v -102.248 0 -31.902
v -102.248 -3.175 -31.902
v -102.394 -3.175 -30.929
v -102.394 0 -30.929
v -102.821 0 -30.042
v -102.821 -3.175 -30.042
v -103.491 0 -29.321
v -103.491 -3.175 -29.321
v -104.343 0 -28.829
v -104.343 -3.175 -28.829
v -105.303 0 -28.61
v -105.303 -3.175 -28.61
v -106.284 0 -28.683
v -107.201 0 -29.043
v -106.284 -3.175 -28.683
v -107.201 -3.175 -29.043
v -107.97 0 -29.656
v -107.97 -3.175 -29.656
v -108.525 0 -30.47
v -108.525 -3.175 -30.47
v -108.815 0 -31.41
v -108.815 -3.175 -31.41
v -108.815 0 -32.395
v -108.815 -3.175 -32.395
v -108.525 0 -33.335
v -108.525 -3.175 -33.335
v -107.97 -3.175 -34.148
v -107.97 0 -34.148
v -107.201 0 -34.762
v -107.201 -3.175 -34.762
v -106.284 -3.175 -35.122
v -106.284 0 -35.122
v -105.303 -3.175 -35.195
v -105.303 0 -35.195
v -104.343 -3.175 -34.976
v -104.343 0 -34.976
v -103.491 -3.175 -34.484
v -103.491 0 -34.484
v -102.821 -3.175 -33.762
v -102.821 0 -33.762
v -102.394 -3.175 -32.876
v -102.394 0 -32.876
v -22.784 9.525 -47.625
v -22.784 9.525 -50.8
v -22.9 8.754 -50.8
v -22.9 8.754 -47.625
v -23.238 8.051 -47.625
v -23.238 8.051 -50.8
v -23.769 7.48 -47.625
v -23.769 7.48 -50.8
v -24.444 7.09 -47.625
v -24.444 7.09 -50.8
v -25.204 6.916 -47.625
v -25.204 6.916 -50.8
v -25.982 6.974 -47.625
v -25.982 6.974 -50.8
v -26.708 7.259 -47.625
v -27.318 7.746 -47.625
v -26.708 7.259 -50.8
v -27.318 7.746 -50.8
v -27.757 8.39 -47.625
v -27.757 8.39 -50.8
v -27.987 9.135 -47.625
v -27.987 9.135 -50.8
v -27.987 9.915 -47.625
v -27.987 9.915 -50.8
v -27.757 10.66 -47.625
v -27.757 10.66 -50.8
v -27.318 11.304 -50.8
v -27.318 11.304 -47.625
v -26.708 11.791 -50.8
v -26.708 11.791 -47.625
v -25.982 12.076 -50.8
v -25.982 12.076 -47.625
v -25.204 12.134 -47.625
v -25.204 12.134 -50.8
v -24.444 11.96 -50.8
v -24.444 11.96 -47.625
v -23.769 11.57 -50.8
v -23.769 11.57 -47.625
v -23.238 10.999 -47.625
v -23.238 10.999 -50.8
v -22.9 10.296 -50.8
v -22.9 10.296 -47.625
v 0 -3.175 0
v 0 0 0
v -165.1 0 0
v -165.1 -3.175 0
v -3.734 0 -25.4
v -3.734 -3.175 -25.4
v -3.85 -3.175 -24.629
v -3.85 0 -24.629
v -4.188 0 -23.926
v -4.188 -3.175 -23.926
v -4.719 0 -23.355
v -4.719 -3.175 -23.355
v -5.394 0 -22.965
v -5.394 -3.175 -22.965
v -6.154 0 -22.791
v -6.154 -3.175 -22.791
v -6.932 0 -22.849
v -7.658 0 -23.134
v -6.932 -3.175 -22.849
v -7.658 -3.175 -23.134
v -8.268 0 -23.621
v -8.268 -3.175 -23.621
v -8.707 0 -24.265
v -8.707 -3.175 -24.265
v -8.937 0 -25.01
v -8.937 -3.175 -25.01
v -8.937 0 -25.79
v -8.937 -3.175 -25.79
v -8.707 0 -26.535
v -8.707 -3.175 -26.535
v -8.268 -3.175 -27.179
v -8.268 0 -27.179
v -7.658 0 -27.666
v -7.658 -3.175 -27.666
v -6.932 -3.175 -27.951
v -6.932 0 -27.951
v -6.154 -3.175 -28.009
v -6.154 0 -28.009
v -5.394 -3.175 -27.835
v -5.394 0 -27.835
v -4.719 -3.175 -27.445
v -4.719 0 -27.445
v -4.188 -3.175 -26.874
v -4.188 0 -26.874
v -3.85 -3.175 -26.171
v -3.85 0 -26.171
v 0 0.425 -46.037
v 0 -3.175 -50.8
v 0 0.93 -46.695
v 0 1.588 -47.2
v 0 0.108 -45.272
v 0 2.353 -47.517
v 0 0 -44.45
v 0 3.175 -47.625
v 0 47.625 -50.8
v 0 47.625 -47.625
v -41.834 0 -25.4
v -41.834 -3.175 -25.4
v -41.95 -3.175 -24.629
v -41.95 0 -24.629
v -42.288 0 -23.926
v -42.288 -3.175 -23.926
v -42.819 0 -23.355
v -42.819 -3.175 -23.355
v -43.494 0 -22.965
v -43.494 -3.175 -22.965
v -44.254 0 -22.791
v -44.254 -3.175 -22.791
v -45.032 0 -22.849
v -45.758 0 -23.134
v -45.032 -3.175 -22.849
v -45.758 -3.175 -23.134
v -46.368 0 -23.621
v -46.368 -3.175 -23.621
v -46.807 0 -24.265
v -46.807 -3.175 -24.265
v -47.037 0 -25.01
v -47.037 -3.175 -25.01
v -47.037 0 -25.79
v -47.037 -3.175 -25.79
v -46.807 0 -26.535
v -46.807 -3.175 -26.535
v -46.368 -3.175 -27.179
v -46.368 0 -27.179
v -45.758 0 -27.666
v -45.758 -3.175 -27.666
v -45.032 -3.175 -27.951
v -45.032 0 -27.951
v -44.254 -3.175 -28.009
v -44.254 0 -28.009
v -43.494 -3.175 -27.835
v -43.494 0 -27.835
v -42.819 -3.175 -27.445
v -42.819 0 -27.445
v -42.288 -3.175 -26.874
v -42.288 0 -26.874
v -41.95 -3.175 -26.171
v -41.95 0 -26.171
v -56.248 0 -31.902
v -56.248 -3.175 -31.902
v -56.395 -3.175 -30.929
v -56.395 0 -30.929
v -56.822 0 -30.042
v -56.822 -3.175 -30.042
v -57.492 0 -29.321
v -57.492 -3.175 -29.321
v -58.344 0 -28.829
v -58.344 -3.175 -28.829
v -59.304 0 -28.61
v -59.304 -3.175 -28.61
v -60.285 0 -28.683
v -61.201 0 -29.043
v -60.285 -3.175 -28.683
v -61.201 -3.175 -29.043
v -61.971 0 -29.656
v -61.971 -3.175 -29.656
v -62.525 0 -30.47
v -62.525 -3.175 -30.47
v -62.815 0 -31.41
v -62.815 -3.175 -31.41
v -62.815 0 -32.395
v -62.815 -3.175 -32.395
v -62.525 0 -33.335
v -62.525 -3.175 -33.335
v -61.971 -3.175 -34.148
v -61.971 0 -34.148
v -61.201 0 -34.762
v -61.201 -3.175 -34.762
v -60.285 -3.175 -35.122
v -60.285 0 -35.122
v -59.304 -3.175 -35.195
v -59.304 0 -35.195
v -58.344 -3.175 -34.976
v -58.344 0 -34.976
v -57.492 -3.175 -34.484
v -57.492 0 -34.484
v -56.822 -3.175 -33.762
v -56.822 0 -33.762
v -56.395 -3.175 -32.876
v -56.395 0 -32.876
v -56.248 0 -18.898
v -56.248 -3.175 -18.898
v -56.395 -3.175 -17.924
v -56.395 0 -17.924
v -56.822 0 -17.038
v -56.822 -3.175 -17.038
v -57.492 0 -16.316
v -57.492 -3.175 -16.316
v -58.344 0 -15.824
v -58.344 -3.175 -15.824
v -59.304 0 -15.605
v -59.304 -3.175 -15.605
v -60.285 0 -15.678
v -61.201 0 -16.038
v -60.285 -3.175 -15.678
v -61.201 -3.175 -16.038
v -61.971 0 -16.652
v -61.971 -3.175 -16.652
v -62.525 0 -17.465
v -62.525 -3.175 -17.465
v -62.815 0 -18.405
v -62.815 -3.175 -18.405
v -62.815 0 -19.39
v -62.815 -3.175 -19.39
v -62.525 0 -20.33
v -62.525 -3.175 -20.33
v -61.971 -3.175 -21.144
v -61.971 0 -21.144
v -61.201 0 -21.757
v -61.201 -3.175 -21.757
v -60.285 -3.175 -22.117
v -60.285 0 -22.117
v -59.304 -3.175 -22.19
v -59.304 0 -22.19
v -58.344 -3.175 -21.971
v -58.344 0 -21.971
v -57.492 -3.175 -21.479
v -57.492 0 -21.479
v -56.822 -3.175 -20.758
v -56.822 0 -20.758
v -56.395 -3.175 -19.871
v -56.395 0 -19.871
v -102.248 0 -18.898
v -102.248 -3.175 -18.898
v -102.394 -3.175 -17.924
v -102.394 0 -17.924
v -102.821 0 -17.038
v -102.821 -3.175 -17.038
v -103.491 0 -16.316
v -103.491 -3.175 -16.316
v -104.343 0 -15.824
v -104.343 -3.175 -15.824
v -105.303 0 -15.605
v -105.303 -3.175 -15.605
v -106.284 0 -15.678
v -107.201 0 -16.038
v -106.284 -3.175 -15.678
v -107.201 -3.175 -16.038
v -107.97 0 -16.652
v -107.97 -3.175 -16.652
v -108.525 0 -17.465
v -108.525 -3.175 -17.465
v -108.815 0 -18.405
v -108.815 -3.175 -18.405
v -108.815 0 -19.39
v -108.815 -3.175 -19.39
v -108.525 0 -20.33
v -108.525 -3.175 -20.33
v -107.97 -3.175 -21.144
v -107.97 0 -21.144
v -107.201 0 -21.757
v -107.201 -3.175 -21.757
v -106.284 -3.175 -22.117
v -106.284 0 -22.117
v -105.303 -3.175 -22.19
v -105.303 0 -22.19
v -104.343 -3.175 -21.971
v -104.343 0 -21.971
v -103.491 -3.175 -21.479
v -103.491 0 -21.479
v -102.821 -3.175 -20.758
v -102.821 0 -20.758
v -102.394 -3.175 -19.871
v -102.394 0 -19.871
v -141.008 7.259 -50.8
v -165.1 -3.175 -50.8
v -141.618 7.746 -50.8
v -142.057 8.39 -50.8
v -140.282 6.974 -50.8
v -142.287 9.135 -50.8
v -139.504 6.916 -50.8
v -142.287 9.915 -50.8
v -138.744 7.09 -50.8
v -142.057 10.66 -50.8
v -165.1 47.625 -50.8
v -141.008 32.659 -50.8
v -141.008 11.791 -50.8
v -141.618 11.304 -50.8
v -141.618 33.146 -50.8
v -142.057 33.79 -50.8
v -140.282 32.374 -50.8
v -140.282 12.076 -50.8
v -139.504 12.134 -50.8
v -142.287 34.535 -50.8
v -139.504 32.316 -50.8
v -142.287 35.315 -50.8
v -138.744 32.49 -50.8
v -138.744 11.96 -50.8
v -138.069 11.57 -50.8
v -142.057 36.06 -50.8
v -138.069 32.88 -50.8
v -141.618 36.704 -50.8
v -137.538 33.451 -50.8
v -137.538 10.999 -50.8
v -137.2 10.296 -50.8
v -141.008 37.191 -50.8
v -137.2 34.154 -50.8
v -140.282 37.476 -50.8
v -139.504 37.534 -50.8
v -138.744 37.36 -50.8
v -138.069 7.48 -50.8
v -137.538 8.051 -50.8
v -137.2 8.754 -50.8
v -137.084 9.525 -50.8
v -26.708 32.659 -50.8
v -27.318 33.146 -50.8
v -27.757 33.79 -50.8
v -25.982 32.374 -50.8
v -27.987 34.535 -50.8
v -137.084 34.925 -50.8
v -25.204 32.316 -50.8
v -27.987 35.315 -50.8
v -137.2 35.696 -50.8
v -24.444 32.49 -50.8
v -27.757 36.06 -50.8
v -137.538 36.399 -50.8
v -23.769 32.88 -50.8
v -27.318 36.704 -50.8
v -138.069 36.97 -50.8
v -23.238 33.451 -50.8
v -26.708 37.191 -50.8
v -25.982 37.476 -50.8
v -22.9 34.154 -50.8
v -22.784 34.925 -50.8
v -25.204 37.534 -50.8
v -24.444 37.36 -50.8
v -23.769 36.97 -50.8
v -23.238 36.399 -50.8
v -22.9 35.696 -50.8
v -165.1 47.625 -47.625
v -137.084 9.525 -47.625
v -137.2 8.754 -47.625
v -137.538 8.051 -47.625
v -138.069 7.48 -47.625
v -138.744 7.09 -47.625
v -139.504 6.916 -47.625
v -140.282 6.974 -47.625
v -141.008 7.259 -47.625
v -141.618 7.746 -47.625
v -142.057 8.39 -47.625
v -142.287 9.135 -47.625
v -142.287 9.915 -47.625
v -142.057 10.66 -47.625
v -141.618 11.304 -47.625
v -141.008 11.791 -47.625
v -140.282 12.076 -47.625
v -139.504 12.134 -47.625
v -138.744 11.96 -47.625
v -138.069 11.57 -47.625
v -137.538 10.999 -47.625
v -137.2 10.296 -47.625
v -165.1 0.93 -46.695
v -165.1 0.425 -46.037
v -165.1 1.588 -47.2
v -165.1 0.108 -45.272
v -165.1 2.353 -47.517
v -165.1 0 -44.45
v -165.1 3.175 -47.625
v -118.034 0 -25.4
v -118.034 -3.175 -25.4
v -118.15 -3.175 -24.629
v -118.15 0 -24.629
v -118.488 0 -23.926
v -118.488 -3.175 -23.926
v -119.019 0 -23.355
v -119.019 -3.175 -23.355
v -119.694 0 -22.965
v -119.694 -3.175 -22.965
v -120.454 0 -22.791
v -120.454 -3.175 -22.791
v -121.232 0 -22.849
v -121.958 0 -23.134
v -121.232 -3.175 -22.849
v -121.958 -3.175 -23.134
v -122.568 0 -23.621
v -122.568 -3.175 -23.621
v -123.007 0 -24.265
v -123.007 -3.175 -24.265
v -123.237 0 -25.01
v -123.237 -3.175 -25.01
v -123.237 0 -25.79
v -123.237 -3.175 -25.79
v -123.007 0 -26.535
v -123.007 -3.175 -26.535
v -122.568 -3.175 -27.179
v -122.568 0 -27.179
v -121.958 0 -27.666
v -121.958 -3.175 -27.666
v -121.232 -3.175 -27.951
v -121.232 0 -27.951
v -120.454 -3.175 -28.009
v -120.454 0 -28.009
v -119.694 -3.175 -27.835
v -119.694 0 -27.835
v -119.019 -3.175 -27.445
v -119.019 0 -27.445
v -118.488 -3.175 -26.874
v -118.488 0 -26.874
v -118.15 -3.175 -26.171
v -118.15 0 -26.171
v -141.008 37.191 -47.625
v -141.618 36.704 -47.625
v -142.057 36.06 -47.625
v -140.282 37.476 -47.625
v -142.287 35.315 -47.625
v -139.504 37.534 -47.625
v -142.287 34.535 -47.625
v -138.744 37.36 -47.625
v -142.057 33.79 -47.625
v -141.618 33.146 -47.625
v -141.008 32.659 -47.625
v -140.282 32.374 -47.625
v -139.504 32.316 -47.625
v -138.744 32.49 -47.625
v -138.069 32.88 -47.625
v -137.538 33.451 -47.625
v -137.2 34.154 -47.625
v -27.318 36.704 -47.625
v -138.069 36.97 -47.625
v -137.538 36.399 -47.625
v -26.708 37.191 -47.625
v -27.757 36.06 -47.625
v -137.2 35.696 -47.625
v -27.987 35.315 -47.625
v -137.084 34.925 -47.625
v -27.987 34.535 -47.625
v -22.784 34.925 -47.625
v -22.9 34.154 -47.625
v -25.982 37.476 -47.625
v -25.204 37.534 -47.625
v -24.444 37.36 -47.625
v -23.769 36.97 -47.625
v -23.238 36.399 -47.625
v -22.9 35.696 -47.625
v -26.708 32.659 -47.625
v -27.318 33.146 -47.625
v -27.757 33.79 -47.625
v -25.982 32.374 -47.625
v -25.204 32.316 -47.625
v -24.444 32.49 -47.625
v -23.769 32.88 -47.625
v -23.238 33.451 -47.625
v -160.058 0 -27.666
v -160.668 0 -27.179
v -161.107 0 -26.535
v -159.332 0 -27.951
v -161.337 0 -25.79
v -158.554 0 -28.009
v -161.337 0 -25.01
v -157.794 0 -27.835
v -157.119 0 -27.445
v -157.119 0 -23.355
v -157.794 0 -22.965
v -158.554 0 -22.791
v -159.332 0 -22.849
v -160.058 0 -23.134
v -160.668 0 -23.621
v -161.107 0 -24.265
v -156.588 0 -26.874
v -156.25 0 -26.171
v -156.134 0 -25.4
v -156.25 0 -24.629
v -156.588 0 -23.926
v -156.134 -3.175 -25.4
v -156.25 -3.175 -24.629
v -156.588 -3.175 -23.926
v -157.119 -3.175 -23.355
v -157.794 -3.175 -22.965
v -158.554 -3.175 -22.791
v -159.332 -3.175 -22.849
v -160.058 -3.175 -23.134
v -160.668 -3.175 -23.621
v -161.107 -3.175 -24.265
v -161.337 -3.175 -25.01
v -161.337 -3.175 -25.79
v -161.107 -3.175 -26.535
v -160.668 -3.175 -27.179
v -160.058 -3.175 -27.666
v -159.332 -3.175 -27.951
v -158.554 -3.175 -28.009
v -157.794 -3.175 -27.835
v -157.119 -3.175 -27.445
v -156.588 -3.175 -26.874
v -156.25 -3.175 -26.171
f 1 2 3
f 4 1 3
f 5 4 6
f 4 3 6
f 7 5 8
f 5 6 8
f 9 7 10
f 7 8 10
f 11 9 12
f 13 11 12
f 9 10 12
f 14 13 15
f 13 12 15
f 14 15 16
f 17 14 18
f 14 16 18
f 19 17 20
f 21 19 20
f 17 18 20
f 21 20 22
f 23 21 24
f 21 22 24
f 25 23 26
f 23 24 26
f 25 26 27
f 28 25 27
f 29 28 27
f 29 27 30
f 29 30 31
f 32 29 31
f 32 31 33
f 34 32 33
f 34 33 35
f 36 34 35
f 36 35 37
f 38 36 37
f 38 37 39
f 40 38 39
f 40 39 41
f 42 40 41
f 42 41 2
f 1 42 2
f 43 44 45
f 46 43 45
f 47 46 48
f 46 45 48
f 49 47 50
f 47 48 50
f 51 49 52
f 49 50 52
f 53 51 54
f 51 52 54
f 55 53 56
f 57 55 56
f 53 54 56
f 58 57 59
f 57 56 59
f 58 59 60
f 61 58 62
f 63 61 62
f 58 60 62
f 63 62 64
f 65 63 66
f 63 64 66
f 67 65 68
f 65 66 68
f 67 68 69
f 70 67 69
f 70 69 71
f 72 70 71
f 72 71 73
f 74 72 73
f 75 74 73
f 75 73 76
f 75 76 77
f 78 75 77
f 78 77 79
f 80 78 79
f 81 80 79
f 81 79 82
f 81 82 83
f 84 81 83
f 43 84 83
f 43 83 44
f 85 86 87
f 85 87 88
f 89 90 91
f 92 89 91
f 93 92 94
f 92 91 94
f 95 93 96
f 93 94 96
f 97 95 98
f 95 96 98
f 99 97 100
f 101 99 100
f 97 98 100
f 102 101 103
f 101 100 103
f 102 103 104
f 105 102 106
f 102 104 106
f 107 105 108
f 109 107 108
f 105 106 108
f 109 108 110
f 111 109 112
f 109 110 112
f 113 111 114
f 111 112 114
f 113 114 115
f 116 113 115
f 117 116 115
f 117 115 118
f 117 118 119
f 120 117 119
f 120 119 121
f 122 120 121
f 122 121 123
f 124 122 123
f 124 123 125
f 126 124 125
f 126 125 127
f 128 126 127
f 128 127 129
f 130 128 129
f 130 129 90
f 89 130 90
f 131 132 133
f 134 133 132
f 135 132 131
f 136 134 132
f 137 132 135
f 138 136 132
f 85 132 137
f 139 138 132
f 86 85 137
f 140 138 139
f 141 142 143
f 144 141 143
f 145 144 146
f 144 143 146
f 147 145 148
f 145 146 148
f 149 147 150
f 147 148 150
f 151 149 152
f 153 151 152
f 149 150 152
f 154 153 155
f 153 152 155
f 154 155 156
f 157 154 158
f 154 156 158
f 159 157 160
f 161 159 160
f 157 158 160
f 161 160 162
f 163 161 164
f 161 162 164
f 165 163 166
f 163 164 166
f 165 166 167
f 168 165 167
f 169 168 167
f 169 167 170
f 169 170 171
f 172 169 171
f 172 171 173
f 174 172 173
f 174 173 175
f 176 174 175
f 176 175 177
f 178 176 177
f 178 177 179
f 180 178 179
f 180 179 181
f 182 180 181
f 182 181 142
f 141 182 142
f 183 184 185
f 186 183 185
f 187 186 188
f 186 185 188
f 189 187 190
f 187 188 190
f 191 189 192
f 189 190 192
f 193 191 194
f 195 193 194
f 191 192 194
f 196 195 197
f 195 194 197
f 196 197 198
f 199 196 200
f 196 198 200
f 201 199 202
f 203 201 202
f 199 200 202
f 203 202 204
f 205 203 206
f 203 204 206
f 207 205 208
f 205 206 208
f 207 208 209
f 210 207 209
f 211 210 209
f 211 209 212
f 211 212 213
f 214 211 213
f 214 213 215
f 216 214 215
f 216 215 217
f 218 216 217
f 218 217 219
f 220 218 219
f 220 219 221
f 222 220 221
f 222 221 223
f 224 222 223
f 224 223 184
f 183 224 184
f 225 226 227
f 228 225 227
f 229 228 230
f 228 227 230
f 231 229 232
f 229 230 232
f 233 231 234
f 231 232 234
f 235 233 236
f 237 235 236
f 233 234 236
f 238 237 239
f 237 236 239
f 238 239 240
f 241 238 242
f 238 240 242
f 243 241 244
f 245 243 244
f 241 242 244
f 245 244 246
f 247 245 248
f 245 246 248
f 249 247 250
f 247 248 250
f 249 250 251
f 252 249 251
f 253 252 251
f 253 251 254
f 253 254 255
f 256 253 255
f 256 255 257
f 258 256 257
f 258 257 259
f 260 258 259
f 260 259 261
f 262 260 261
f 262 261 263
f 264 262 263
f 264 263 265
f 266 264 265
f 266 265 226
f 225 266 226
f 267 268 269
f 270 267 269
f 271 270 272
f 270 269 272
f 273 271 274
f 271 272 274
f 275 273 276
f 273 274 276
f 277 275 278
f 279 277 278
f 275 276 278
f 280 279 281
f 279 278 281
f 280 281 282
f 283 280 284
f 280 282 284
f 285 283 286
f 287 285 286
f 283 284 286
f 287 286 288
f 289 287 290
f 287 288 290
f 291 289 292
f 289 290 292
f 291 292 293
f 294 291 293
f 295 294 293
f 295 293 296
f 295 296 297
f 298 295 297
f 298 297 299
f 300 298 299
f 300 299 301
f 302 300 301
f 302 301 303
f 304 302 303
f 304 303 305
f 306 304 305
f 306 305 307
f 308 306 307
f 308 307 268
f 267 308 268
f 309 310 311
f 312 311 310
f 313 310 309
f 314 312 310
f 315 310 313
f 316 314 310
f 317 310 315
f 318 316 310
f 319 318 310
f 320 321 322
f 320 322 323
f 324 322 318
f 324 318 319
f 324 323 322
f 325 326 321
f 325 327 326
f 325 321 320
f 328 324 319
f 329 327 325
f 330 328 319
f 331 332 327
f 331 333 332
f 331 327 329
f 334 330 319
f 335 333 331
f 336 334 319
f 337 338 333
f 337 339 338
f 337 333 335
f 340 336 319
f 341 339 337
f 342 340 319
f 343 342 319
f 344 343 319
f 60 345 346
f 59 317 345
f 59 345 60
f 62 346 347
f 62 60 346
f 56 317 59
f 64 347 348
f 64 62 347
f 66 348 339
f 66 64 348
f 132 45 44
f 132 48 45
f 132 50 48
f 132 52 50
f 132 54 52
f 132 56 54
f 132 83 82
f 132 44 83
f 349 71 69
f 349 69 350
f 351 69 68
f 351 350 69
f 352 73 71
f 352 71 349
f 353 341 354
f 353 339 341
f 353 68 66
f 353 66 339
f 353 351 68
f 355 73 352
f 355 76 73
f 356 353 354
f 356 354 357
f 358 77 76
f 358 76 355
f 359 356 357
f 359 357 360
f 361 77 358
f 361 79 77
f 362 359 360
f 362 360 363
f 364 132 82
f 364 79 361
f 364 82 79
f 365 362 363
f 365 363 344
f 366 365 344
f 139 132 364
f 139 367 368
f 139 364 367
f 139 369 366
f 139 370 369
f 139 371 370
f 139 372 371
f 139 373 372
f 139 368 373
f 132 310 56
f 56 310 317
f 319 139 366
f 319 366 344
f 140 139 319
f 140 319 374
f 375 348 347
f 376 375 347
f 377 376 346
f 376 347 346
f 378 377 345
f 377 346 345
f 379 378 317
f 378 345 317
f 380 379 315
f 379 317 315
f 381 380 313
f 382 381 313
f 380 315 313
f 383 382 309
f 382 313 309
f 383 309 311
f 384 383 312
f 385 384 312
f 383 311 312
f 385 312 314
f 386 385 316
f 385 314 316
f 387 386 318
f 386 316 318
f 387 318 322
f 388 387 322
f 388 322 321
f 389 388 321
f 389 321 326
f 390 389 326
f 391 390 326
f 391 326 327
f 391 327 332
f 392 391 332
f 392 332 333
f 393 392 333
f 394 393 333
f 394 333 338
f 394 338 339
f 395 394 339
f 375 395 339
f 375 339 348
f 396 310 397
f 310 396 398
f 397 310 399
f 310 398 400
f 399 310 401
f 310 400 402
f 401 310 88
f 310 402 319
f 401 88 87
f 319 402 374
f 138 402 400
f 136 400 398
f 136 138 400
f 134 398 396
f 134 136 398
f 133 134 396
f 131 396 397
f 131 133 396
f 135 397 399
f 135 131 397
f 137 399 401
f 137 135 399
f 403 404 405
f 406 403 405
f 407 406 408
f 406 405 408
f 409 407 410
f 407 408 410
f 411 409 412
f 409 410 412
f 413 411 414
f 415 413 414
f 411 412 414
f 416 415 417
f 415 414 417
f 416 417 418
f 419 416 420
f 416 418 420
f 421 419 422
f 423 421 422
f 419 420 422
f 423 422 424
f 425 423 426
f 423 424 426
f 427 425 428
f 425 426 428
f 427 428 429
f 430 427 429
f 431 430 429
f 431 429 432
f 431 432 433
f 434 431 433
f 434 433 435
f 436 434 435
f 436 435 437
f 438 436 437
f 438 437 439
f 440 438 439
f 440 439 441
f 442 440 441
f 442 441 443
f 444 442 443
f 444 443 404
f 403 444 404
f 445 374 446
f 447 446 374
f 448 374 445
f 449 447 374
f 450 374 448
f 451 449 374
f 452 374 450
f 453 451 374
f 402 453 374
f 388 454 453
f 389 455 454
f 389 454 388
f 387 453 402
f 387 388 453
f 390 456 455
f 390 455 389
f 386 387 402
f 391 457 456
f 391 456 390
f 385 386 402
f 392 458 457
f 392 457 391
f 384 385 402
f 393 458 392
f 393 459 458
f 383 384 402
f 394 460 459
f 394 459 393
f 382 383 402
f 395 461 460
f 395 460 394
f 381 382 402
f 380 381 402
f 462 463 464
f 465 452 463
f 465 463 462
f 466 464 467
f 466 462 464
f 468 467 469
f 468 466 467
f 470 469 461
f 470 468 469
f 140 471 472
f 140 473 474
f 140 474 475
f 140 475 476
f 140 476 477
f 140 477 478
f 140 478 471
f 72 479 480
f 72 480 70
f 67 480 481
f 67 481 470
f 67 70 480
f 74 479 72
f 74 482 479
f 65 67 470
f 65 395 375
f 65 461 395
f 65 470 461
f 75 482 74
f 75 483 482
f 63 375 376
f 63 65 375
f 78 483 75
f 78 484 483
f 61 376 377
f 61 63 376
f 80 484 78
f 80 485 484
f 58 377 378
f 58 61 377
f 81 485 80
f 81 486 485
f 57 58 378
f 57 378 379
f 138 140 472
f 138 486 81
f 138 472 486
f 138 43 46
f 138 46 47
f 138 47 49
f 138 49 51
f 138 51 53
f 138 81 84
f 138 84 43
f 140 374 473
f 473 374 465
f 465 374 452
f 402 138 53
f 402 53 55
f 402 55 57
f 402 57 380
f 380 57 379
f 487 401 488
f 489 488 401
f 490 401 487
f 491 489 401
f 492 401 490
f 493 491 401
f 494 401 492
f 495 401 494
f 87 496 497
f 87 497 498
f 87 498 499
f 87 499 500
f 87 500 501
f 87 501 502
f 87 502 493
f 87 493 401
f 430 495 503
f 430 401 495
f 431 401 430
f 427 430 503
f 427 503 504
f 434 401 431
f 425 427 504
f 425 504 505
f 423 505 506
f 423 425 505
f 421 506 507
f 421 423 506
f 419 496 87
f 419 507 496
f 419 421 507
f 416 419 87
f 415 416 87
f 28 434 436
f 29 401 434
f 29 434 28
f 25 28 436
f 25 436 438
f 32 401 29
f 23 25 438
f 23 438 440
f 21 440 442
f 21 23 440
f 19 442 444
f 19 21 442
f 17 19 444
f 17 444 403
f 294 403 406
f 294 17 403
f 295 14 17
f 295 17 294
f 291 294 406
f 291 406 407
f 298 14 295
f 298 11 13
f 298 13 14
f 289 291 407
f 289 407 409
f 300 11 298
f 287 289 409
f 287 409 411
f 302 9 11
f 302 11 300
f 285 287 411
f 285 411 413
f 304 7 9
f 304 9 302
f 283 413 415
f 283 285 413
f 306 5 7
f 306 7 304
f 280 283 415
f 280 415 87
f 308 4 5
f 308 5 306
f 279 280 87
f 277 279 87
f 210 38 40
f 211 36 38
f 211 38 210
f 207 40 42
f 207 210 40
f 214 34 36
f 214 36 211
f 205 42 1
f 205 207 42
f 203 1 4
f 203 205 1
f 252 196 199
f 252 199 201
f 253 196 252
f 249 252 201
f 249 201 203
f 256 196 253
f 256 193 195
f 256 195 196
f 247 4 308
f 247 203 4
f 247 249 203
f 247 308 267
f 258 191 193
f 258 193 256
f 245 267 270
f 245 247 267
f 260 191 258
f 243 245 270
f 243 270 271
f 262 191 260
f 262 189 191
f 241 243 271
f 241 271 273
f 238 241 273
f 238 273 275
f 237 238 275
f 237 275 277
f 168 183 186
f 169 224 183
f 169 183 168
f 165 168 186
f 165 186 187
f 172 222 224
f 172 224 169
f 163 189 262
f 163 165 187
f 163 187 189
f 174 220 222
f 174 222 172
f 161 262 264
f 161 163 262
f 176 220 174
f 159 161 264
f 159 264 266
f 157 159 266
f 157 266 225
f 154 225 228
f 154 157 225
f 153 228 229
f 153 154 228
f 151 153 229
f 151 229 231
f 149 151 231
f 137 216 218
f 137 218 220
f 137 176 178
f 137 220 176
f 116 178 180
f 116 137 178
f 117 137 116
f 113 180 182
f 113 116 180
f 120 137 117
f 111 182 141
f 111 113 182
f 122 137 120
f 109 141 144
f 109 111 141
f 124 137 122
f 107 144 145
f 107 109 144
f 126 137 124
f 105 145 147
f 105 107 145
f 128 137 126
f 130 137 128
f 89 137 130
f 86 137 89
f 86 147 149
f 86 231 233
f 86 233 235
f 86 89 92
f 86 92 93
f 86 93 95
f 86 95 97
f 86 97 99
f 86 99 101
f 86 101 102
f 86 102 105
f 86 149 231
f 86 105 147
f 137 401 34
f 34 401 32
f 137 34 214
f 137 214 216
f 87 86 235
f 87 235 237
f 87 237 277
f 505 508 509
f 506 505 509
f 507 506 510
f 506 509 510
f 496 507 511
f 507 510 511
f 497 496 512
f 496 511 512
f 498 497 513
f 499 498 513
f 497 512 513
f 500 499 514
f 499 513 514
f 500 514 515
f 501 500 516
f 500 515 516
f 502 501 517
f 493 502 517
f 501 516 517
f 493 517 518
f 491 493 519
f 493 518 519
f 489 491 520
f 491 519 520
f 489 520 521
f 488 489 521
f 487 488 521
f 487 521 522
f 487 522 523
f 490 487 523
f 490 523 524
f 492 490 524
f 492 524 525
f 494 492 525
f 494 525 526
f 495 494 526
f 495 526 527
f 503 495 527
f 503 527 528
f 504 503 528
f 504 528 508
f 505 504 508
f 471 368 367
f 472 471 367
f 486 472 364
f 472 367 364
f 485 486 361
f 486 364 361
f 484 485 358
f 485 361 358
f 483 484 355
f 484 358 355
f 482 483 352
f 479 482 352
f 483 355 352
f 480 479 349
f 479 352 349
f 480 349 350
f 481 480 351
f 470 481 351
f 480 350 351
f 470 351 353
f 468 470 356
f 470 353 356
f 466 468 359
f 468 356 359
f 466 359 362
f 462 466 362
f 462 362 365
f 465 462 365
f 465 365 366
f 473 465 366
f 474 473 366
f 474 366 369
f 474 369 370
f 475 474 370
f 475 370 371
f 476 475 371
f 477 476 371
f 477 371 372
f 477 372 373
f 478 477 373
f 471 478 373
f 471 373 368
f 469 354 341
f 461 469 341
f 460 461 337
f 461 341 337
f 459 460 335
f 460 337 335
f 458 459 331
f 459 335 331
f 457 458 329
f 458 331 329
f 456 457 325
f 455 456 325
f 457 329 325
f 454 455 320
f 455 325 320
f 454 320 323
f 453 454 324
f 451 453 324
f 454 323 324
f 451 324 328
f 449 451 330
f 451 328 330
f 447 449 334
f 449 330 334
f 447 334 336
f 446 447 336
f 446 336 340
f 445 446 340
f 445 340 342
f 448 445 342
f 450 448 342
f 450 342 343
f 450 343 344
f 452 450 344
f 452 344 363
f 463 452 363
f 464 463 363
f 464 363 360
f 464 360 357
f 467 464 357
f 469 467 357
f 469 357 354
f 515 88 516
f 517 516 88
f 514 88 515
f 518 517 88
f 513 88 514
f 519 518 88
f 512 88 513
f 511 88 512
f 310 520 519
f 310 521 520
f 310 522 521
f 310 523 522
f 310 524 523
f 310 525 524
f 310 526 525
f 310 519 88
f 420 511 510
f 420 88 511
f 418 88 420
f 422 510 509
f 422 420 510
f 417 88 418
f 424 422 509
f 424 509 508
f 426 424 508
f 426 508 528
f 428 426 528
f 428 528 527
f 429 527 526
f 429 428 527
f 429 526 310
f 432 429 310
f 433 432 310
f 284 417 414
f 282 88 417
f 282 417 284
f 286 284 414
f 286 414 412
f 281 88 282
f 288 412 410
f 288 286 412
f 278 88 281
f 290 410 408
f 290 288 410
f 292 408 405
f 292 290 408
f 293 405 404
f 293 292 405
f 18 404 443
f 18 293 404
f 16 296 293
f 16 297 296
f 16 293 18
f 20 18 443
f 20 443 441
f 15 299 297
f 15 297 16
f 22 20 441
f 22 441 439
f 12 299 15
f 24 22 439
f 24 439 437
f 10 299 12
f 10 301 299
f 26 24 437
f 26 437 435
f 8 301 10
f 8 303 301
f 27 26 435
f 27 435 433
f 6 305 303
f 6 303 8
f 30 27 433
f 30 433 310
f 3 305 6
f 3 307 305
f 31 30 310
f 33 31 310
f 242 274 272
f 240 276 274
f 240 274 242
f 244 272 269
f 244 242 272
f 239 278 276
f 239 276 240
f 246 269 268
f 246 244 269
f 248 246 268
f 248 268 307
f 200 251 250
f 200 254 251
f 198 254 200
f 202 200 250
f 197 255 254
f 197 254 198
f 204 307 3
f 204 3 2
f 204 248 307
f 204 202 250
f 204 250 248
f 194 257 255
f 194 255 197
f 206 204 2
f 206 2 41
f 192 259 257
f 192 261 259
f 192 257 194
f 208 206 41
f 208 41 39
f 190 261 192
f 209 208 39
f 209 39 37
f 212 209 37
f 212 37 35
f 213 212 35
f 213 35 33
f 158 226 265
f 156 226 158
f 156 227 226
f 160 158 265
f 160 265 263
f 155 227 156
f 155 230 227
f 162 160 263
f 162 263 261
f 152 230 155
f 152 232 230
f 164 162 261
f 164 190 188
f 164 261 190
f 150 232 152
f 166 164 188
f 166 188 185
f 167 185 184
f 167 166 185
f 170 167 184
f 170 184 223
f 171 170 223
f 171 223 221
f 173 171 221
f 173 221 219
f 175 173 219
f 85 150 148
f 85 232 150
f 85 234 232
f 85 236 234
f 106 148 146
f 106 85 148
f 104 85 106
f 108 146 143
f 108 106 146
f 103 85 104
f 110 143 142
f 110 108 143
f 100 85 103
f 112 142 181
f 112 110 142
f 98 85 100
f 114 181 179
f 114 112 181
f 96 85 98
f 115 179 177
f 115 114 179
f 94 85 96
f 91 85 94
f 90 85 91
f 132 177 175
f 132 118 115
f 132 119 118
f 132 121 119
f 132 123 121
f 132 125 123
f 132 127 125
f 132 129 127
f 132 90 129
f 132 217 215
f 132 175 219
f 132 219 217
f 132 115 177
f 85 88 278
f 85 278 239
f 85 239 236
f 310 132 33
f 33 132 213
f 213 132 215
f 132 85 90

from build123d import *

# Parameters (mm, degrees)
F1_DEPTH = 165.1
F2_R     = 2.6162
F2_R_2   = 3.302
F3_DEPTH = 50.801
F4_R     = 2.6162
F5_DEPTH = 25.4


with BuildPart() as f1:
    # F0 (on Right) → F1 (new body)
    with BuildSketch(Plane.YZ):
        with BuildLine():
            Line((0, -44.45), (0, 0))
            Line((0, 0), (-3.175, 0))
            Line((-3.175, 0), (-3.175, -50.8))
            Line((-3.175, -50.8), (47.625, -50.8))
            Line((47.625, -50.8), (47.625, -47.625))
            Line((47.625, -47.625), (3.175, -47.625))
            ThreePointArc((3.175, -47.625), (0.929936, -46.695064), (0, -44.45))
        make_face()
    extrude(amount=-F1_DEPTH)

    # F2 (on face) → F3 (cut, through all)
    with BuildSketch(Plane.XZ.offset(3.175)):
        with Locations((-158.75, -25.4)):
            Circle(F2_R)
        with Locations((-120.65, -25.4)):
            Circle(F2_R)
        with Locations((-44.45, -25.4)):
            Circle(F2_R)
        with Locations((-6.35, -25.4)):
            Circle(F2_R)
        with Locations((-59.5503, -31.9024)):
            Circle(F2_R_2)
        with Locations((-105.5497, -31.9024)):
            Circle(F2_R_2)
        with Locations((-59.5503, -18.8976)):
            Circle(F2_R_2)
        with Locations((-105.5497, -18.8976)):
            Circle(F2_R_2)
    extrude(amount=-F3_DEPTH, mode=Mode.SUBTRACT)

    # F4 (on face) → F5 (cut)
    with BuildSketch(Plane(origin=(0, 0, -50.8), x_dir=(1, 0, 0), z_dir=(0, 0, -1))):
        with Locations((-25.4, -34.925)):
            Circle(F4_R)
        with Locations((-25.4, -9.525)):
            Circle(F4_R)
        with Locations((-139.7, -34.925)):
            Circle(F4_R)
        with Locations((-139.7, -9.525)):
            Circle(F4_R)
    extrude(amount=-F5_DEPTH, mode=Mode.SUBTRACT)


solid = f1.part
